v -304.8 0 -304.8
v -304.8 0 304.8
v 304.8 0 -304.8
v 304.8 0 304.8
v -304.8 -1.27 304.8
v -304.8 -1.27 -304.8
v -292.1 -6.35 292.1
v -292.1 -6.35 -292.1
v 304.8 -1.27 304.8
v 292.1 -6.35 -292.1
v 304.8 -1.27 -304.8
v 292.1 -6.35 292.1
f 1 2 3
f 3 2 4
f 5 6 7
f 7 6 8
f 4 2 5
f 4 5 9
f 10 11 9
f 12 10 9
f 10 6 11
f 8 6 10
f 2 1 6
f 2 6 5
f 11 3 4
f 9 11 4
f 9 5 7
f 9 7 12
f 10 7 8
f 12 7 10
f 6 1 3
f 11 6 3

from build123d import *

# Parameters (mm, degrees)
F0_W     = 609.6
F0_H     = 609.6
F1_DEPTH = 6.35
F2_SIZE2 = 5.08
F2_SIZE  = 12.7


with BuildPart() as f1:
    # F0 (on Front) → F1 (new body)
    with BuildSketch(Plane.XZ):
        Rectangle(F0_W, F0_H)
    extrude(amount=F1_DEPTH)

    # F2
    f2_edges = [f1.edges().sort_by_distance(p)[0] for p in [
        (304.8, -6.35, 0),
        (0, -6.35, 304.8),
        (-304.8, -6.35, 0),
        (0, -6.35, -304.8),
    ]]
    f2_side = f1.faces().sort_by_distance((0, -6.35, 0))[0]
    chamfer(f2_edges, length=F2_SIZE, length2=F2_SIZE2, reference=f2_side)


solid = f1.part
